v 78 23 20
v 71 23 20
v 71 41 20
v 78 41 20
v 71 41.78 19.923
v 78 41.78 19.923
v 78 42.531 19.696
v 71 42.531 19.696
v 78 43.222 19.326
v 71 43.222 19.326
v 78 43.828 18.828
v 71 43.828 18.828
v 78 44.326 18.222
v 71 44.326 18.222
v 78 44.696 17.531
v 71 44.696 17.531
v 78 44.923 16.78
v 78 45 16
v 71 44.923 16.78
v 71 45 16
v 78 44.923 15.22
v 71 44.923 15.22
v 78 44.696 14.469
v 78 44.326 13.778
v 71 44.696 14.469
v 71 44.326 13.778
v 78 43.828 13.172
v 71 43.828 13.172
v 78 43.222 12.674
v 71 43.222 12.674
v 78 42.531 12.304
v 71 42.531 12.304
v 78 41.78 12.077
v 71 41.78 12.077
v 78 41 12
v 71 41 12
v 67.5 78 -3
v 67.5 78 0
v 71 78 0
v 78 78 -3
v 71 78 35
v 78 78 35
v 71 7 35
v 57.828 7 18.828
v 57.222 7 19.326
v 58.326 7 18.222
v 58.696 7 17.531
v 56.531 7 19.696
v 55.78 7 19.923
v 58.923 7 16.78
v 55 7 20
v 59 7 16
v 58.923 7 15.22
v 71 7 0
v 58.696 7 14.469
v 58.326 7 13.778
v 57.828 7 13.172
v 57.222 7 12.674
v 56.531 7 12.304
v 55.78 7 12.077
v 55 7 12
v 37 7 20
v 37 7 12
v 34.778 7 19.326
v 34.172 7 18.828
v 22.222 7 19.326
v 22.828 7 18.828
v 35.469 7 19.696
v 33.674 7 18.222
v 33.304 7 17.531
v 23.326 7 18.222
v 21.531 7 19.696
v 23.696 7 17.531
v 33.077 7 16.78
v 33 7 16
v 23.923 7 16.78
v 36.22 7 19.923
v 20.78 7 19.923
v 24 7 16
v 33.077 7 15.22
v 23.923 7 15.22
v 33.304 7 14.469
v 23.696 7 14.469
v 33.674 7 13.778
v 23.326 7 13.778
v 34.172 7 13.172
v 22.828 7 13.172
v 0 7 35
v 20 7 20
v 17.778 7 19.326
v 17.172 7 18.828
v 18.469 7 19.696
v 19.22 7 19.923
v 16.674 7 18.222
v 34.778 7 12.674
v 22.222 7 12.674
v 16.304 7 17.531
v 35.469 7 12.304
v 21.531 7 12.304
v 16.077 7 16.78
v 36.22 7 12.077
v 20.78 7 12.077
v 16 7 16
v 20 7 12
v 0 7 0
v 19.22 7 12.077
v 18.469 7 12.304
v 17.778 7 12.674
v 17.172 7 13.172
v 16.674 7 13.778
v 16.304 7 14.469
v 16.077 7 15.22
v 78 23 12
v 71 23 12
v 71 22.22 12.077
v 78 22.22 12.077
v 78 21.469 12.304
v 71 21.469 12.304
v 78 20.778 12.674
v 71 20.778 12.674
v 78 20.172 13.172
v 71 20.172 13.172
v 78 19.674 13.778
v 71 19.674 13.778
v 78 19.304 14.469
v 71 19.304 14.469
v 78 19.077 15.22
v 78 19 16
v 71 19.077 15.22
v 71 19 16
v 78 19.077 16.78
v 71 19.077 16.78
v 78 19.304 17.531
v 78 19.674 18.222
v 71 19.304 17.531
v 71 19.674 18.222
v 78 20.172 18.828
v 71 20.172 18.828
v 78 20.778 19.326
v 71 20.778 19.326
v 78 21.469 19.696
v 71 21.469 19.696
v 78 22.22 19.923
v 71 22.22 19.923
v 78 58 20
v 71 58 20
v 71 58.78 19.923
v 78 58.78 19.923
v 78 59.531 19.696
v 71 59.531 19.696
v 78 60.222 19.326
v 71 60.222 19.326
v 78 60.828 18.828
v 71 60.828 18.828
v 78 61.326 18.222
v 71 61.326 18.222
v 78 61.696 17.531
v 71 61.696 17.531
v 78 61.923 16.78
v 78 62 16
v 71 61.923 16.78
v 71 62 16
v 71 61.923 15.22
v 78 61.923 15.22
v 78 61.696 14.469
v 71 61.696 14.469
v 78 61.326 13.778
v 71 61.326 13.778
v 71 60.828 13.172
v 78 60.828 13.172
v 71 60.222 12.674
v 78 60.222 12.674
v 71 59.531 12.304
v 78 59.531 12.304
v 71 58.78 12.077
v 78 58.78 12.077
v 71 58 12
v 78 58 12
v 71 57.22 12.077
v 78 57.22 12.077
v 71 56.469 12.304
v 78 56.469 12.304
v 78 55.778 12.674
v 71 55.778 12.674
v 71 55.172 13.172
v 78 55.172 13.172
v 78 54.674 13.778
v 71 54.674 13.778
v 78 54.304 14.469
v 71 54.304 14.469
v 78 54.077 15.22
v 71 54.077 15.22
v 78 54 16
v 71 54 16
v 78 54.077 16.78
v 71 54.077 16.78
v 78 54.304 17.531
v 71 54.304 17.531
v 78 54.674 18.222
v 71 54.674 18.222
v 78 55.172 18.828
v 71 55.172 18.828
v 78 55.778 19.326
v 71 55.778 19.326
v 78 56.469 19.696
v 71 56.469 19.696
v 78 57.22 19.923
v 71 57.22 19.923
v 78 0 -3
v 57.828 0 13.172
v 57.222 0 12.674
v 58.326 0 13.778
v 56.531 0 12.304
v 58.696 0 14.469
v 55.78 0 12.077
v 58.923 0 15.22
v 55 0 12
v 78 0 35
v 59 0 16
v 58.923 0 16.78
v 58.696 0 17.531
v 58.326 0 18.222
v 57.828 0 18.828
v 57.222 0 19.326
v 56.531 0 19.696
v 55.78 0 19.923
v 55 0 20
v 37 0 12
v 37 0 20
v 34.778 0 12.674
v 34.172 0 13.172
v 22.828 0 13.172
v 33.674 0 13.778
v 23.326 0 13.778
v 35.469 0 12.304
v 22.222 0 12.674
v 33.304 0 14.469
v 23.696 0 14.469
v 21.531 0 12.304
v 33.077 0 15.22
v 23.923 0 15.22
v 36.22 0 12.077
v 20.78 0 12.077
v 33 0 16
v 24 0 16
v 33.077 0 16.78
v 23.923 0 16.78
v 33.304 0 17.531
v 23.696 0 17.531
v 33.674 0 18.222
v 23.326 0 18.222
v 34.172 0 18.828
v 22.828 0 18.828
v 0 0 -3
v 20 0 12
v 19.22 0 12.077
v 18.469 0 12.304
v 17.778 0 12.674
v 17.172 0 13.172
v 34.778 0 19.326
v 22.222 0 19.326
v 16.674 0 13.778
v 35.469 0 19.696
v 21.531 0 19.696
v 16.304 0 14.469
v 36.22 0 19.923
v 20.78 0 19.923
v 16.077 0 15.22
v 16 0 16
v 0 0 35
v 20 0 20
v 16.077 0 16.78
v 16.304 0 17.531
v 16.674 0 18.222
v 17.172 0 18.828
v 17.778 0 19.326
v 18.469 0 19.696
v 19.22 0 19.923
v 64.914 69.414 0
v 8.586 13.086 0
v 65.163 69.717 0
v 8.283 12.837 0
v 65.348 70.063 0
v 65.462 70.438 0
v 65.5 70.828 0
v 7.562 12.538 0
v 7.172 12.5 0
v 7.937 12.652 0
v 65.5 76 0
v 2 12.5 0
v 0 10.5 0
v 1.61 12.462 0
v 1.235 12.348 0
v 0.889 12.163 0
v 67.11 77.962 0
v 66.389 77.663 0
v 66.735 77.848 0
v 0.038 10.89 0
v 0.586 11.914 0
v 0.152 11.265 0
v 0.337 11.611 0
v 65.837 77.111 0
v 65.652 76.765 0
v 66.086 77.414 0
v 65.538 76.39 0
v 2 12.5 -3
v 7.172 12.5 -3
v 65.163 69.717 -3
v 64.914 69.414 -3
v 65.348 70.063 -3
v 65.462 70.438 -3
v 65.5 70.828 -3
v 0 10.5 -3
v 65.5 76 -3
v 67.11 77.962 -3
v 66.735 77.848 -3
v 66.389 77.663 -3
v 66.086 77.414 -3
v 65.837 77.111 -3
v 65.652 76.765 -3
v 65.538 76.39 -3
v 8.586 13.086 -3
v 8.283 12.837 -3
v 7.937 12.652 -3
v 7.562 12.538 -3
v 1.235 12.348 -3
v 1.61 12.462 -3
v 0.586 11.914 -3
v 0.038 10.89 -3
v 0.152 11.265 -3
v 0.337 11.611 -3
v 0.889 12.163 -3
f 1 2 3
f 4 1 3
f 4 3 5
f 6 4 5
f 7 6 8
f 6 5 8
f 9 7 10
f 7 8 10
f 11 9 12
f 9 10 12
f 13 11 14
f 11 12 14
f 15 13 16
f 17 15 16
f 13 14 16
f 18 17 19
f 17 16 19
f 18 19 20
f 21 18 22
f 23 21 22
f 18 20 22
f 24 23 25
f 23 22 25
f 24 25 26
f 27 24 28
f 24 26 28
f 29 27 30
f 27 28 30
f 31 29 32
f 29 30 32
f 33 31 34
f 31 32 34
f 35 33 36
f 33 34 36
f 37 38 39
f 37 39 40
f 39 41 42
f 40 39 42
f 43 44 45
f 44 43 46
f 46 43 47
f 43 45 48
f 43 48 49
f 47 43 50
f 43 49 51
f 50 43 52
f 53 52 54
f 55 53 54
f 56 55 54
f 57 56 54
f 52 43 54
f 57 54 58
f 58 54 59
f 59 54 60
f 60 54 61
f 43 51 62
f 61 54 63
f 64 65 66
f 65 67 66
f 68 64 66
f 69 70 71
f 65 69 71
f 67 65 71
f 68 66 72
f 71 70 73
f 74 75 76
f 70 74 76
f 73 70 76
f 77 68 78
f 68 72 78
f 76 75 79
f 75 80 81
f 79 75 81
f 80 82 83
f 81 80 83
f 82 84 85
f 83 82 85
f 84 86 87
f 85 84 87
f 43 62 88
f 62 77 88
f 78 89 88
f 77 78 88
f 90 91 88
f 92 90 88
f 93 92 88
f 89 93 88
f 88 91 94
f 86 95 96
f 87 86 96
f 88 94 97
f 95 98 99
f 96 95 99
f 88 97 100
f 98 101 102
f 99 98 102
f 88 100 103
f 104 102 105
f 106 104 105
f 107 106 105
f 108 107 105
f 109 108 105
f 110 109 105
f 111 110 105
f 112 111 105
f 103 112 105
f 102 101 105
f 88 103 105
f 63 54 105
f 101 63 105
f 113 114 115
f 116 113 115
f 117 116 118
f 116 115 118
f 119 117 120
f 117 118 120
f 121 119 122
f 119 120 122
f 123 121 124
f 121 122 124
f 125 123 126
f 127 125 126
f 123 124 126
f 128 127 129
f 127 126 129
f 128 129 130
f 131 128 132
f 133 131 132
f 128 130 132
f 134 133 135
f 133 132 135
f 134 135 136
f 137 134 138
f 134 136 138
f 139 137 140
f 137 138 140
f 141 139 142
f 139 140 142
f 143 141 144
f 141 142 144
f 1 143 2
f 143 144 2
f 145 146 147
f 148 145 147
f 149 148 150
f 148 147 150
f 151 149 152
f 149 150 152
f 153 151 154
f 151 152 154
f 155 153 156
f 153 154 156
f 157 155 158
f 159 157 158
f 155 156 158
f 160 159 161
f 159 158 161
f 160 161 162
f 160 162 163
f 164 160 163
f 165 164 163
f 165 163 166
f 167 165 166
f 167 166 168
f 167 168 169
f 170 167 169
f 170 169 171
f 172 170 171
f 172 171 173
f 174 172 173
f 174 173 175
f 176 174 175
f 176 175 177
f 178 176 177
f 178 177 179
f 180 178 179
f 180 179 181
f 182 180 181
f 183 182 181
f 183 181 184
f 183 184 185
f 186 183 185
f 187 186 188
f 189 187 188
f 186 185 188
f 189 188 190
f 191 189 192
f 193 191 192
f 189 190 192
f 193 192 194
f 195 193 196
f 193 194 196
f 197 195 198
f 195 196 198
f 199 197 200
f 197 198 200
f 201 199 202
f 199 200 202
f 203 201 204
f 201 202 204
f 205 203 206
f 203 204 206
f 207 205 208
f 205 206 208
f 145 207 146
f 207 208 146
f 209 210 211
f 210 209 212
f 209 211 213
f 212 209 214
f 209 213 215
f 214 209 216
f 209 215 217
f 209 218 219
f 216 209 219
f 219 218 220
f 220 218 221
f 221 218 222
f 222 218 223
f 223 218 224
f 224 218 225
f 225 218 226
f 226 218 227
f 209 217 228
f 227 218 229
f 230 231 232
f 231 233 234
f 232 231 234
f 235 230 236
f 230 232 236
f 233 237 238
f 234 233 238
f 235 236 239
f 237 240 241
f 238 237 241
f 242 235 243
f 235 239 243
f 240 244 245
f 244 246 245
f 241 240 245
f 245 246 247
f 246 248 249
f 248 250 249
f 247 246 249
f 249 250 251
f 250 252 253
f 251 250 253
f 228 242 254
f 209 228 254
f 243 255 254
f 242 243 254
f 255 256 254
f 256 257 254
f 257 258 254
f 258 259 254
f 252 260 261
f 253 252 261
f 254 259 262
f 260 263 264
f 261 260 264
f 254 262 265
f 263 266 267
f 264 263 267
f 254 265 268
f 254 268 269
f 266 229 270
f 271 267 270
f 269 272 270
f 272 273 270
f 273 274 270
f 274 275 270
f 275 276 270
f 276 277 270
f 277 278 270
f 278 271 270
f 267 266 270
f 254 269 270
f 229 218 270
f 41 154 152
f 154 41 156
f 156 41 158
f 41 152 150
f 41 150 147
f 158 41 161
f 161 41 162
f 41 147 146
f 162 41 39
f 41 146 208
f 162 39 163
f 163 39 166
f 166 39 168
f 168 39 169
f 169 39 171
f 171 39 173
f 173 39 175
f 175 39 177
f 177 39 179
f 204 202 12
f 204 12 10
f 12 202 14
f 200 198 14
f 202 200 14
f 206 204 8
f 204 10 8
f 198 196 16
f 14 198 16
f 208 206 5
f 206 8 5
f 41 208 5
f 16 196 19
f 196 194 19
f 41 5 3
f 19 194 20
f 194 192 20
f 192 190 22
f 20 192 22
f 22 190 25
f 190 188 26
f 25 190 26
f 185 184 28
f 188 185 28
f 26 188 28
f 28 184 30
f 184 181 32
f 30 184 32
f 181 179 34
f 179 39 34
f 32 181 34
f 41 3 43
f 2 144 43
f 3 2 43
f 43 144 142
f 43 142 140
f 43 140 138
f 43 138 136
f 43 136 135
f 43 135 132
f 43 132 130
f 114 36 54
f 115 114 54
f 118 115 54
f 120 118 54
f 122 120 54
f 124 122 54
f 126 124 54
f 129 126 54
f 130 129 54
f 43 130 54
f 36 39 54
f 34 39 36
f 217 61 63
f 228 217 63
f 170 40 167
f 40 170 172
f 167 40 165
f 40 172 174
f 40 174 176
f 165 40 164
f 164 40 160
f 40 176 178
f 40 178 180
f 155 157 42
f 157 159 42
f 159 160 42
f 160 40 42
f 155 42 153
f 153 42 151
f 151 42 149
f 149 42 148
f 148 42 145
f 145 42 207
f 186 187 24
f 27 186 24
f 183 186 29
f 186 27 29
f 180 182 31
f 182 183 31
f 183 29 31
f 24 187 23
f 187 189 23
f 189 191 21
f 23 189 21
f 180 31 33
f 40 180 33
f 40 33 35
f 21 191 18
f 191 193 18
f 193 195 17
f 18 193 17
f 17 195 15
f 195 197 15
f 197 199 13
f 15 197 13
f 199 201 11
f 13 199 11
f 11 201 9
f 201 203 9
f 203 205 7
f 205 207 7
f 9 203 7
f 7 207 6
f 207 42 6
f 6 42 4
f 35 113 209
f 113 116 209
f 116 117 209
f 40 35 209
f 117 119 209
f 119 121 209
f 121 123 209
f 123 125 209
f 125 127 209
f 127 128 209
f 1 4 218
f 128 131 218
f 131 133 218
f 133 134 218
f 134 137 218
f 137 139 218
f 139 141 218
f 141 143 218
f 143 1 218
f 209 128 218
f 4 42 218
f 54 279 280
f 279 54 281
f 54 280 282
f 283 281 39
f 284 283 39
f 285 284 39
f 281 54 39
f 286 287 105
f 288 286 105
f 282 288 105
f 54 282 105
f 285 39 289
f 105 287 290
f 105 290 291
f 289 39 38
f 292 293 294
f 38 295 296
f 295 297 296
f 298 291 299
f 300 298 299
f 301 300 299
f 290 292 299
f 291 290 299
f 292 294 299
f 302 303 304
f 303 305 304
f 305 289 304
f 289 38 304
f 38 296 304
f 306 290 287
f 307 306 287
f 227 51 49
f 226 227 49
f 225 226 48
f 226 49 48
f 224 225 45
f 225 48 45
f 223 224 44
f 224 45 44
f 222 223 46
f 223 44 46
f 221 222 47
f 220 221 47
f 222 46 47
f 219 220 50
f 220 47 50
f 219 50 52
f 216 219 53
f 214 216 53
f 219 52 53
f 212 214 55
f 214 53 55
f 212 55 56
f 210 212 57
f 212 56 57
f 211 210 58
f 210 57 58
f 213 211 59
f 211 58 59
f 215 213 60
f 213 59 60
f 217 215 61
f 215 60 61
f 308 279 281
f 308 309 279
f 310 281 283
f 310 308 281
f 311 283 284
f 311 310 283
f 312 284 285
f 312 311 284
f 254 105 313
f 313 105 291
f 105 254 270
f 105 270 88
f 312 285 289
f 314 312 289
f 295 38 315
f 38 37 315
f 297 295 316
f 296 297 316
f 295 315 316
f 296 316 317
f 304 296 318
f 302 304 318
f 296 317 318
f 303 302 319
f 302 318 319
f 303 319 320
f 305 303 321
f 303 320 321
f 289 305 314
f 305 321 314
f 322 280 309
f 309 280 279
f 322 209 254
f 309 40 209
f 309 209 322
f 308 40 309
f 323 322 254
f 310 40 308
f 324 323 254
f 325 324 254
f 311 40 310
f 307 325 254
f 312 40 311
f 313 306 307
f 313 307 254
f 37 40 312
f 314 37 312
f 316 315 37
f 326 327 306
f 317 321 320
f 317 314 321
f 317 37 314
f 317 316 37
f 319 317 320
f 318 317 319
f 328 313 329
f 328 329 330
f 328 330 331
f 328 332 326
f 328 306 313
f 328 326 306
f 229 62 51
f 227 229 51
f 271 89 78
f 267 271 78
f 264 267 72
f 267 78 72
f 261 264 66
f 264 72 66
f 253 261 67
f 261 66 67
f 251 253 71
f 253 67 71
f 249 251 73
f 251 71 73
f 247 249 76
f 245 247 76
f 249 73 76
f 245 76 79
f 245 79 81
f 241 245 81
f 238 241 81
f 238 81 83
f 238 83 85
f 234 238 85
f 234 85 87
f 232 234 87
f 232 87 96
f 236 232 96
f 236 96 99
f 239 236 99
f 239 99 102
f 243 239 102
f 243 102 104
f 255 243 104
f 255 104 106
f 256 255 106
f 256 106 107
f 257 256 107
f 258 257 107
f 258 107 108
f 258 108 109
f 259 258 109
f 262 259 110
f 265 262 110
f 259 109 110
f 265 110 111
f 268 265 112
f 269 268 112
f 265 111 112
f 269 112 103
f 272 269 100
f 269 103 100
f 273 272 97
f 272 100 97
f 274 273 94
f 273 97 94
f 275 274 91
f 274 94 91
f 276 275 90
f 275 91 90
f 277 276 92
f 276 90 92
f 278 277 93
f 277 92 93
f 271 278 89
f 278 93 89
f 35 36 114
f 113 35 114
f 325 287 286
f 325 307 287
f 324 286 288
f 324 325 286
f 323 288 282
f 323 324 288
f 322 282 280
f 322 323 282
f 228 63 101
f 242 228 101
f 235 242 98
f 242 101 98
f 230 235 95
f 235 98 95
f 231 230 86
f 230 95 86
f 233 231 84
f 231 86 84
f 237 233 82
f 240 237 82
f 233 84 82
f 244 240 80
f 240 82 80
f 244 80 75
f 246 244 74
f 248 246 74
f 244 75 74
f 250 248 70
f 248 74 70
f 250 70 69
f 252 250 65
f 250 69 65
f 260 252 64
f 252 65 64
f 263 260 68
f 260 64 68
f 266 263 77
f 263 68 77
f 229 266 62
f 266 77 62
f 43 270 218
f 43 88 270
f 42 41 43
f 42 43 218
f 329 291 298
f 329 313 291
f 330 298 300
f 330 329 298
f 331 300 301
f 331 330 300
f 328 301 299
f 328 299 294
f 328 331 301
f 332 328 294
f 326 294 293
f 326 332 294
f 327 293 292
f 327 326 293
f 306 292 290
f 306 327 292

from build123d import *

# Parameters (mm, degrees)
EXTRUDE_1_DEPTH     = 35
EXTRUDE_2_DEPTH     = 3
SKETCH_3_R          = 4
CUT_EXTRUDE_1_DEPTH = 112.130553854
SKETCH_4_R          = 4
CUT_EXTRUDE_2_DEPTH = 112.130553854
FILLET_1_R          = 2
FILLET_2_R          = 2


with BuildPart() as part:
    # 草图1 → 凸台-拉伸1 (new body)
    with BuildSketch(Plane.XY):
        Polygon((0, 0), (78, 0), (78, 78), (71, 78), (71, 7), (0, 7), align=None)
    extrude(amount=EXTRUDE_1_DEPTH)

    # 草图2 → 凸台-拉伸2 (add)
    with BuildSketch(Plane(origin=(0, 0, 0), x_dir=(-1, 0, 0), z_dir=(0, 0, -1))):
        Polygon((-78, 78), (-78, 0), (0, 0), (0, 12.5), (-8, 12.5), (-65.5, 70), (-65.5, 78), align=None)
    extrude(amount=EXTRUDE_2_DEPTH)

    # 草图3 → 切除-拉伸1 (cut, through all)
    with BuildSketch(Plane.ZY.offset(-71)):
        with Locations((16, 58)):
            Circle(SKETCH_3_R)
        with BuildLine():
            Line((12, 41), (12, 23))
            ThreePointArc((12, 23), (16, 19), (20, 23))
            Line((20, 23), (20, 41))
            ThreePointArc((20, 41), (16, 45), (12, 41))
        make_face()
    extrude(amount=-CUT_EXTRUDE_1_DEPTH, mode=Mode.SUBTRACT)

    # 草图4 → 切除-拉伸2 (cut, through all)
    with BuildSketch(Plane(origin=(0, 7, 0), x_dir=(1, 0, 0), z_dir=(0, 1, 0))):
        with Locations(Location((20, -16, 0), (0, 0, 270))):
            Circle(SKETCH_4_R)
        with BuildLine():
            Line((37, -20), (55, -20))
            ThreePointArc((55, -20), (59, -16), (55, -12))
            Line((55, -12), (37, -12))
            ThreePointArc((37, -12), (33, -16), (37, -20))
        make_face()
    extrude(amount=-CUT_EXTRUDE_2_DEPTH, mode=Mode.SUBTRACT)

    # 圆角1
    fillet_1_edges = [part.edges().sort_by_distance(p)[0] for p in [
        (65.5, 78, -1.5),
        (0, 12.5, -1.5),
    ]]
    fillet(fillet_1_edges, radius=FILLET_1_R)

    # 圆角2
    fillet_2_edges = [part.edges().sort_by_distance(p)[0] for p in [
        (8, 12.5, -1.5),
        (65.5, 70, -1.5),
    ]]
    fillet(fillet_2_edges, radius=FILLET_2_R)


solid = part.part
